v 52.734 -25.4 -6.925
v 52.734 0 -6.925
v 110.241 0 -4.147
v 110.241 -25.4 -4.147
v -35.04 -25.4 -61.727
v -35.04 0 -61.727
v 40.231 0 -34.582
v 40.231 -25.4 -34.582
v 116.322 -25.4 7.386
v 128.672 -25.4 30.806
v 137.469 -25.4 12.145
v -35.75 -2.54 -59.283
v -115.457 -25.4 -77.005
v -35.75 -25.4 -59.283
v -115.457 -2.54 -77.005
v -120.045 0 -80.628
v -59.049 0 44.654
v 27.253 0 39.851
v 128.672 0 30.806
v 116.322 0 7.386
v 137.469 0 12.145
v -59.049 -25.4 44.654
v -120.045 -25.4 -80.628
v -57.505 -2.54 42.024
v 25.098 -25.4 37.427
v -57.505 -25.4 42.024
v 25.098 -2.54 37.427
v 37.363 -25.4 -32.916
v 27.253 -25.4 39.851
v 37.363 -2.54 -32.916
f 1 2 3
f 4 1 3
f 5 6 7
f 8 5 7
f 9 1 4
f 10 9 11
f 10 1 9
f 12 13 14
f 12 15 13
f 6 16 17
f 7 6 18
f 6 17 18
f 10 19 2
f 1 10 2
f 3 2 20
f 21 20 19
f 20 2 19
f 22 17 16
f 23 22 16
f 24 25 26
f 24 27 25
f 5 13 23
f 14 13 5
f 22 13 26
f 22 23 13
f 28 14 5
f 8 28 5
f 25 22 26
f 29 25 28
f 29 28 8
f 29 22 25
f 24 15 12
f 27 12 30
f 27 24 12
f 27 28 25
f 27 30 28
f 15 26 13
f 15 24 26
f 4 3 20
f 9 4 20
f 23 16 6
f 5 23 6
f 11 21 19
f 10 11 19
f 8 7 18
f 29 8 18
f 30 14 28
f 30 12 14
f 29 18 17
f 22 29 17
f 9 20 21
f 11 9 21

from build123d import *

# Parameters (mm, degrees)
F1_DEPTH = 25.4
F2_T     = -2.54


with BuildPart() as f1:
    # F0 (on Front) → F1 (new body)
    with BuildSketch(Plane.XZ):
        Polygon((27.2534992546, 39.8514419794), (-59.049256146, 44.653788209), (-120.0451850891, -80.6277096272), (-35.0402183831, -61.7274530232), align=None)
        Polygon((40.2313619852, -34.5815382898), (27.2534992546, 39.8514419794), (-35.0402183831, -61.7274530232), align=None)
    extrude(amount=F1_DEPTH)

    # F2
    f2_openings = [f1.faces().sort_by_distance(p)[0] for p in [
        (-33.259144, -25.4, -14.378218),
    ]]
    offset(amount=F2_T, openings=f2_openings)


with BuildPart() as f1b:
    # F0 (on Front) → F1, piece 2 (new body)
    with BuildSketch(Plane.XZ):
        Polygon((128.6721378565, 30.8055691421), (52.7335224494, -6.9245833926), (116.3219529464, 7.3855059196), align=None)
        Polygon((116.3219529464, 7.3855059196), (52.7335224494, -6.9245833926), (110.2405264974, -4.1469037533), align=None)
        Polygon((128.6721378565, 30.8055691421), (116.3219529464, 7.3855059196), (137.4690681696, 12.1445022523), align=None)
    extrude(amount=F1_DEPTH)


solid = Compound([f1.part, f1b.part])
